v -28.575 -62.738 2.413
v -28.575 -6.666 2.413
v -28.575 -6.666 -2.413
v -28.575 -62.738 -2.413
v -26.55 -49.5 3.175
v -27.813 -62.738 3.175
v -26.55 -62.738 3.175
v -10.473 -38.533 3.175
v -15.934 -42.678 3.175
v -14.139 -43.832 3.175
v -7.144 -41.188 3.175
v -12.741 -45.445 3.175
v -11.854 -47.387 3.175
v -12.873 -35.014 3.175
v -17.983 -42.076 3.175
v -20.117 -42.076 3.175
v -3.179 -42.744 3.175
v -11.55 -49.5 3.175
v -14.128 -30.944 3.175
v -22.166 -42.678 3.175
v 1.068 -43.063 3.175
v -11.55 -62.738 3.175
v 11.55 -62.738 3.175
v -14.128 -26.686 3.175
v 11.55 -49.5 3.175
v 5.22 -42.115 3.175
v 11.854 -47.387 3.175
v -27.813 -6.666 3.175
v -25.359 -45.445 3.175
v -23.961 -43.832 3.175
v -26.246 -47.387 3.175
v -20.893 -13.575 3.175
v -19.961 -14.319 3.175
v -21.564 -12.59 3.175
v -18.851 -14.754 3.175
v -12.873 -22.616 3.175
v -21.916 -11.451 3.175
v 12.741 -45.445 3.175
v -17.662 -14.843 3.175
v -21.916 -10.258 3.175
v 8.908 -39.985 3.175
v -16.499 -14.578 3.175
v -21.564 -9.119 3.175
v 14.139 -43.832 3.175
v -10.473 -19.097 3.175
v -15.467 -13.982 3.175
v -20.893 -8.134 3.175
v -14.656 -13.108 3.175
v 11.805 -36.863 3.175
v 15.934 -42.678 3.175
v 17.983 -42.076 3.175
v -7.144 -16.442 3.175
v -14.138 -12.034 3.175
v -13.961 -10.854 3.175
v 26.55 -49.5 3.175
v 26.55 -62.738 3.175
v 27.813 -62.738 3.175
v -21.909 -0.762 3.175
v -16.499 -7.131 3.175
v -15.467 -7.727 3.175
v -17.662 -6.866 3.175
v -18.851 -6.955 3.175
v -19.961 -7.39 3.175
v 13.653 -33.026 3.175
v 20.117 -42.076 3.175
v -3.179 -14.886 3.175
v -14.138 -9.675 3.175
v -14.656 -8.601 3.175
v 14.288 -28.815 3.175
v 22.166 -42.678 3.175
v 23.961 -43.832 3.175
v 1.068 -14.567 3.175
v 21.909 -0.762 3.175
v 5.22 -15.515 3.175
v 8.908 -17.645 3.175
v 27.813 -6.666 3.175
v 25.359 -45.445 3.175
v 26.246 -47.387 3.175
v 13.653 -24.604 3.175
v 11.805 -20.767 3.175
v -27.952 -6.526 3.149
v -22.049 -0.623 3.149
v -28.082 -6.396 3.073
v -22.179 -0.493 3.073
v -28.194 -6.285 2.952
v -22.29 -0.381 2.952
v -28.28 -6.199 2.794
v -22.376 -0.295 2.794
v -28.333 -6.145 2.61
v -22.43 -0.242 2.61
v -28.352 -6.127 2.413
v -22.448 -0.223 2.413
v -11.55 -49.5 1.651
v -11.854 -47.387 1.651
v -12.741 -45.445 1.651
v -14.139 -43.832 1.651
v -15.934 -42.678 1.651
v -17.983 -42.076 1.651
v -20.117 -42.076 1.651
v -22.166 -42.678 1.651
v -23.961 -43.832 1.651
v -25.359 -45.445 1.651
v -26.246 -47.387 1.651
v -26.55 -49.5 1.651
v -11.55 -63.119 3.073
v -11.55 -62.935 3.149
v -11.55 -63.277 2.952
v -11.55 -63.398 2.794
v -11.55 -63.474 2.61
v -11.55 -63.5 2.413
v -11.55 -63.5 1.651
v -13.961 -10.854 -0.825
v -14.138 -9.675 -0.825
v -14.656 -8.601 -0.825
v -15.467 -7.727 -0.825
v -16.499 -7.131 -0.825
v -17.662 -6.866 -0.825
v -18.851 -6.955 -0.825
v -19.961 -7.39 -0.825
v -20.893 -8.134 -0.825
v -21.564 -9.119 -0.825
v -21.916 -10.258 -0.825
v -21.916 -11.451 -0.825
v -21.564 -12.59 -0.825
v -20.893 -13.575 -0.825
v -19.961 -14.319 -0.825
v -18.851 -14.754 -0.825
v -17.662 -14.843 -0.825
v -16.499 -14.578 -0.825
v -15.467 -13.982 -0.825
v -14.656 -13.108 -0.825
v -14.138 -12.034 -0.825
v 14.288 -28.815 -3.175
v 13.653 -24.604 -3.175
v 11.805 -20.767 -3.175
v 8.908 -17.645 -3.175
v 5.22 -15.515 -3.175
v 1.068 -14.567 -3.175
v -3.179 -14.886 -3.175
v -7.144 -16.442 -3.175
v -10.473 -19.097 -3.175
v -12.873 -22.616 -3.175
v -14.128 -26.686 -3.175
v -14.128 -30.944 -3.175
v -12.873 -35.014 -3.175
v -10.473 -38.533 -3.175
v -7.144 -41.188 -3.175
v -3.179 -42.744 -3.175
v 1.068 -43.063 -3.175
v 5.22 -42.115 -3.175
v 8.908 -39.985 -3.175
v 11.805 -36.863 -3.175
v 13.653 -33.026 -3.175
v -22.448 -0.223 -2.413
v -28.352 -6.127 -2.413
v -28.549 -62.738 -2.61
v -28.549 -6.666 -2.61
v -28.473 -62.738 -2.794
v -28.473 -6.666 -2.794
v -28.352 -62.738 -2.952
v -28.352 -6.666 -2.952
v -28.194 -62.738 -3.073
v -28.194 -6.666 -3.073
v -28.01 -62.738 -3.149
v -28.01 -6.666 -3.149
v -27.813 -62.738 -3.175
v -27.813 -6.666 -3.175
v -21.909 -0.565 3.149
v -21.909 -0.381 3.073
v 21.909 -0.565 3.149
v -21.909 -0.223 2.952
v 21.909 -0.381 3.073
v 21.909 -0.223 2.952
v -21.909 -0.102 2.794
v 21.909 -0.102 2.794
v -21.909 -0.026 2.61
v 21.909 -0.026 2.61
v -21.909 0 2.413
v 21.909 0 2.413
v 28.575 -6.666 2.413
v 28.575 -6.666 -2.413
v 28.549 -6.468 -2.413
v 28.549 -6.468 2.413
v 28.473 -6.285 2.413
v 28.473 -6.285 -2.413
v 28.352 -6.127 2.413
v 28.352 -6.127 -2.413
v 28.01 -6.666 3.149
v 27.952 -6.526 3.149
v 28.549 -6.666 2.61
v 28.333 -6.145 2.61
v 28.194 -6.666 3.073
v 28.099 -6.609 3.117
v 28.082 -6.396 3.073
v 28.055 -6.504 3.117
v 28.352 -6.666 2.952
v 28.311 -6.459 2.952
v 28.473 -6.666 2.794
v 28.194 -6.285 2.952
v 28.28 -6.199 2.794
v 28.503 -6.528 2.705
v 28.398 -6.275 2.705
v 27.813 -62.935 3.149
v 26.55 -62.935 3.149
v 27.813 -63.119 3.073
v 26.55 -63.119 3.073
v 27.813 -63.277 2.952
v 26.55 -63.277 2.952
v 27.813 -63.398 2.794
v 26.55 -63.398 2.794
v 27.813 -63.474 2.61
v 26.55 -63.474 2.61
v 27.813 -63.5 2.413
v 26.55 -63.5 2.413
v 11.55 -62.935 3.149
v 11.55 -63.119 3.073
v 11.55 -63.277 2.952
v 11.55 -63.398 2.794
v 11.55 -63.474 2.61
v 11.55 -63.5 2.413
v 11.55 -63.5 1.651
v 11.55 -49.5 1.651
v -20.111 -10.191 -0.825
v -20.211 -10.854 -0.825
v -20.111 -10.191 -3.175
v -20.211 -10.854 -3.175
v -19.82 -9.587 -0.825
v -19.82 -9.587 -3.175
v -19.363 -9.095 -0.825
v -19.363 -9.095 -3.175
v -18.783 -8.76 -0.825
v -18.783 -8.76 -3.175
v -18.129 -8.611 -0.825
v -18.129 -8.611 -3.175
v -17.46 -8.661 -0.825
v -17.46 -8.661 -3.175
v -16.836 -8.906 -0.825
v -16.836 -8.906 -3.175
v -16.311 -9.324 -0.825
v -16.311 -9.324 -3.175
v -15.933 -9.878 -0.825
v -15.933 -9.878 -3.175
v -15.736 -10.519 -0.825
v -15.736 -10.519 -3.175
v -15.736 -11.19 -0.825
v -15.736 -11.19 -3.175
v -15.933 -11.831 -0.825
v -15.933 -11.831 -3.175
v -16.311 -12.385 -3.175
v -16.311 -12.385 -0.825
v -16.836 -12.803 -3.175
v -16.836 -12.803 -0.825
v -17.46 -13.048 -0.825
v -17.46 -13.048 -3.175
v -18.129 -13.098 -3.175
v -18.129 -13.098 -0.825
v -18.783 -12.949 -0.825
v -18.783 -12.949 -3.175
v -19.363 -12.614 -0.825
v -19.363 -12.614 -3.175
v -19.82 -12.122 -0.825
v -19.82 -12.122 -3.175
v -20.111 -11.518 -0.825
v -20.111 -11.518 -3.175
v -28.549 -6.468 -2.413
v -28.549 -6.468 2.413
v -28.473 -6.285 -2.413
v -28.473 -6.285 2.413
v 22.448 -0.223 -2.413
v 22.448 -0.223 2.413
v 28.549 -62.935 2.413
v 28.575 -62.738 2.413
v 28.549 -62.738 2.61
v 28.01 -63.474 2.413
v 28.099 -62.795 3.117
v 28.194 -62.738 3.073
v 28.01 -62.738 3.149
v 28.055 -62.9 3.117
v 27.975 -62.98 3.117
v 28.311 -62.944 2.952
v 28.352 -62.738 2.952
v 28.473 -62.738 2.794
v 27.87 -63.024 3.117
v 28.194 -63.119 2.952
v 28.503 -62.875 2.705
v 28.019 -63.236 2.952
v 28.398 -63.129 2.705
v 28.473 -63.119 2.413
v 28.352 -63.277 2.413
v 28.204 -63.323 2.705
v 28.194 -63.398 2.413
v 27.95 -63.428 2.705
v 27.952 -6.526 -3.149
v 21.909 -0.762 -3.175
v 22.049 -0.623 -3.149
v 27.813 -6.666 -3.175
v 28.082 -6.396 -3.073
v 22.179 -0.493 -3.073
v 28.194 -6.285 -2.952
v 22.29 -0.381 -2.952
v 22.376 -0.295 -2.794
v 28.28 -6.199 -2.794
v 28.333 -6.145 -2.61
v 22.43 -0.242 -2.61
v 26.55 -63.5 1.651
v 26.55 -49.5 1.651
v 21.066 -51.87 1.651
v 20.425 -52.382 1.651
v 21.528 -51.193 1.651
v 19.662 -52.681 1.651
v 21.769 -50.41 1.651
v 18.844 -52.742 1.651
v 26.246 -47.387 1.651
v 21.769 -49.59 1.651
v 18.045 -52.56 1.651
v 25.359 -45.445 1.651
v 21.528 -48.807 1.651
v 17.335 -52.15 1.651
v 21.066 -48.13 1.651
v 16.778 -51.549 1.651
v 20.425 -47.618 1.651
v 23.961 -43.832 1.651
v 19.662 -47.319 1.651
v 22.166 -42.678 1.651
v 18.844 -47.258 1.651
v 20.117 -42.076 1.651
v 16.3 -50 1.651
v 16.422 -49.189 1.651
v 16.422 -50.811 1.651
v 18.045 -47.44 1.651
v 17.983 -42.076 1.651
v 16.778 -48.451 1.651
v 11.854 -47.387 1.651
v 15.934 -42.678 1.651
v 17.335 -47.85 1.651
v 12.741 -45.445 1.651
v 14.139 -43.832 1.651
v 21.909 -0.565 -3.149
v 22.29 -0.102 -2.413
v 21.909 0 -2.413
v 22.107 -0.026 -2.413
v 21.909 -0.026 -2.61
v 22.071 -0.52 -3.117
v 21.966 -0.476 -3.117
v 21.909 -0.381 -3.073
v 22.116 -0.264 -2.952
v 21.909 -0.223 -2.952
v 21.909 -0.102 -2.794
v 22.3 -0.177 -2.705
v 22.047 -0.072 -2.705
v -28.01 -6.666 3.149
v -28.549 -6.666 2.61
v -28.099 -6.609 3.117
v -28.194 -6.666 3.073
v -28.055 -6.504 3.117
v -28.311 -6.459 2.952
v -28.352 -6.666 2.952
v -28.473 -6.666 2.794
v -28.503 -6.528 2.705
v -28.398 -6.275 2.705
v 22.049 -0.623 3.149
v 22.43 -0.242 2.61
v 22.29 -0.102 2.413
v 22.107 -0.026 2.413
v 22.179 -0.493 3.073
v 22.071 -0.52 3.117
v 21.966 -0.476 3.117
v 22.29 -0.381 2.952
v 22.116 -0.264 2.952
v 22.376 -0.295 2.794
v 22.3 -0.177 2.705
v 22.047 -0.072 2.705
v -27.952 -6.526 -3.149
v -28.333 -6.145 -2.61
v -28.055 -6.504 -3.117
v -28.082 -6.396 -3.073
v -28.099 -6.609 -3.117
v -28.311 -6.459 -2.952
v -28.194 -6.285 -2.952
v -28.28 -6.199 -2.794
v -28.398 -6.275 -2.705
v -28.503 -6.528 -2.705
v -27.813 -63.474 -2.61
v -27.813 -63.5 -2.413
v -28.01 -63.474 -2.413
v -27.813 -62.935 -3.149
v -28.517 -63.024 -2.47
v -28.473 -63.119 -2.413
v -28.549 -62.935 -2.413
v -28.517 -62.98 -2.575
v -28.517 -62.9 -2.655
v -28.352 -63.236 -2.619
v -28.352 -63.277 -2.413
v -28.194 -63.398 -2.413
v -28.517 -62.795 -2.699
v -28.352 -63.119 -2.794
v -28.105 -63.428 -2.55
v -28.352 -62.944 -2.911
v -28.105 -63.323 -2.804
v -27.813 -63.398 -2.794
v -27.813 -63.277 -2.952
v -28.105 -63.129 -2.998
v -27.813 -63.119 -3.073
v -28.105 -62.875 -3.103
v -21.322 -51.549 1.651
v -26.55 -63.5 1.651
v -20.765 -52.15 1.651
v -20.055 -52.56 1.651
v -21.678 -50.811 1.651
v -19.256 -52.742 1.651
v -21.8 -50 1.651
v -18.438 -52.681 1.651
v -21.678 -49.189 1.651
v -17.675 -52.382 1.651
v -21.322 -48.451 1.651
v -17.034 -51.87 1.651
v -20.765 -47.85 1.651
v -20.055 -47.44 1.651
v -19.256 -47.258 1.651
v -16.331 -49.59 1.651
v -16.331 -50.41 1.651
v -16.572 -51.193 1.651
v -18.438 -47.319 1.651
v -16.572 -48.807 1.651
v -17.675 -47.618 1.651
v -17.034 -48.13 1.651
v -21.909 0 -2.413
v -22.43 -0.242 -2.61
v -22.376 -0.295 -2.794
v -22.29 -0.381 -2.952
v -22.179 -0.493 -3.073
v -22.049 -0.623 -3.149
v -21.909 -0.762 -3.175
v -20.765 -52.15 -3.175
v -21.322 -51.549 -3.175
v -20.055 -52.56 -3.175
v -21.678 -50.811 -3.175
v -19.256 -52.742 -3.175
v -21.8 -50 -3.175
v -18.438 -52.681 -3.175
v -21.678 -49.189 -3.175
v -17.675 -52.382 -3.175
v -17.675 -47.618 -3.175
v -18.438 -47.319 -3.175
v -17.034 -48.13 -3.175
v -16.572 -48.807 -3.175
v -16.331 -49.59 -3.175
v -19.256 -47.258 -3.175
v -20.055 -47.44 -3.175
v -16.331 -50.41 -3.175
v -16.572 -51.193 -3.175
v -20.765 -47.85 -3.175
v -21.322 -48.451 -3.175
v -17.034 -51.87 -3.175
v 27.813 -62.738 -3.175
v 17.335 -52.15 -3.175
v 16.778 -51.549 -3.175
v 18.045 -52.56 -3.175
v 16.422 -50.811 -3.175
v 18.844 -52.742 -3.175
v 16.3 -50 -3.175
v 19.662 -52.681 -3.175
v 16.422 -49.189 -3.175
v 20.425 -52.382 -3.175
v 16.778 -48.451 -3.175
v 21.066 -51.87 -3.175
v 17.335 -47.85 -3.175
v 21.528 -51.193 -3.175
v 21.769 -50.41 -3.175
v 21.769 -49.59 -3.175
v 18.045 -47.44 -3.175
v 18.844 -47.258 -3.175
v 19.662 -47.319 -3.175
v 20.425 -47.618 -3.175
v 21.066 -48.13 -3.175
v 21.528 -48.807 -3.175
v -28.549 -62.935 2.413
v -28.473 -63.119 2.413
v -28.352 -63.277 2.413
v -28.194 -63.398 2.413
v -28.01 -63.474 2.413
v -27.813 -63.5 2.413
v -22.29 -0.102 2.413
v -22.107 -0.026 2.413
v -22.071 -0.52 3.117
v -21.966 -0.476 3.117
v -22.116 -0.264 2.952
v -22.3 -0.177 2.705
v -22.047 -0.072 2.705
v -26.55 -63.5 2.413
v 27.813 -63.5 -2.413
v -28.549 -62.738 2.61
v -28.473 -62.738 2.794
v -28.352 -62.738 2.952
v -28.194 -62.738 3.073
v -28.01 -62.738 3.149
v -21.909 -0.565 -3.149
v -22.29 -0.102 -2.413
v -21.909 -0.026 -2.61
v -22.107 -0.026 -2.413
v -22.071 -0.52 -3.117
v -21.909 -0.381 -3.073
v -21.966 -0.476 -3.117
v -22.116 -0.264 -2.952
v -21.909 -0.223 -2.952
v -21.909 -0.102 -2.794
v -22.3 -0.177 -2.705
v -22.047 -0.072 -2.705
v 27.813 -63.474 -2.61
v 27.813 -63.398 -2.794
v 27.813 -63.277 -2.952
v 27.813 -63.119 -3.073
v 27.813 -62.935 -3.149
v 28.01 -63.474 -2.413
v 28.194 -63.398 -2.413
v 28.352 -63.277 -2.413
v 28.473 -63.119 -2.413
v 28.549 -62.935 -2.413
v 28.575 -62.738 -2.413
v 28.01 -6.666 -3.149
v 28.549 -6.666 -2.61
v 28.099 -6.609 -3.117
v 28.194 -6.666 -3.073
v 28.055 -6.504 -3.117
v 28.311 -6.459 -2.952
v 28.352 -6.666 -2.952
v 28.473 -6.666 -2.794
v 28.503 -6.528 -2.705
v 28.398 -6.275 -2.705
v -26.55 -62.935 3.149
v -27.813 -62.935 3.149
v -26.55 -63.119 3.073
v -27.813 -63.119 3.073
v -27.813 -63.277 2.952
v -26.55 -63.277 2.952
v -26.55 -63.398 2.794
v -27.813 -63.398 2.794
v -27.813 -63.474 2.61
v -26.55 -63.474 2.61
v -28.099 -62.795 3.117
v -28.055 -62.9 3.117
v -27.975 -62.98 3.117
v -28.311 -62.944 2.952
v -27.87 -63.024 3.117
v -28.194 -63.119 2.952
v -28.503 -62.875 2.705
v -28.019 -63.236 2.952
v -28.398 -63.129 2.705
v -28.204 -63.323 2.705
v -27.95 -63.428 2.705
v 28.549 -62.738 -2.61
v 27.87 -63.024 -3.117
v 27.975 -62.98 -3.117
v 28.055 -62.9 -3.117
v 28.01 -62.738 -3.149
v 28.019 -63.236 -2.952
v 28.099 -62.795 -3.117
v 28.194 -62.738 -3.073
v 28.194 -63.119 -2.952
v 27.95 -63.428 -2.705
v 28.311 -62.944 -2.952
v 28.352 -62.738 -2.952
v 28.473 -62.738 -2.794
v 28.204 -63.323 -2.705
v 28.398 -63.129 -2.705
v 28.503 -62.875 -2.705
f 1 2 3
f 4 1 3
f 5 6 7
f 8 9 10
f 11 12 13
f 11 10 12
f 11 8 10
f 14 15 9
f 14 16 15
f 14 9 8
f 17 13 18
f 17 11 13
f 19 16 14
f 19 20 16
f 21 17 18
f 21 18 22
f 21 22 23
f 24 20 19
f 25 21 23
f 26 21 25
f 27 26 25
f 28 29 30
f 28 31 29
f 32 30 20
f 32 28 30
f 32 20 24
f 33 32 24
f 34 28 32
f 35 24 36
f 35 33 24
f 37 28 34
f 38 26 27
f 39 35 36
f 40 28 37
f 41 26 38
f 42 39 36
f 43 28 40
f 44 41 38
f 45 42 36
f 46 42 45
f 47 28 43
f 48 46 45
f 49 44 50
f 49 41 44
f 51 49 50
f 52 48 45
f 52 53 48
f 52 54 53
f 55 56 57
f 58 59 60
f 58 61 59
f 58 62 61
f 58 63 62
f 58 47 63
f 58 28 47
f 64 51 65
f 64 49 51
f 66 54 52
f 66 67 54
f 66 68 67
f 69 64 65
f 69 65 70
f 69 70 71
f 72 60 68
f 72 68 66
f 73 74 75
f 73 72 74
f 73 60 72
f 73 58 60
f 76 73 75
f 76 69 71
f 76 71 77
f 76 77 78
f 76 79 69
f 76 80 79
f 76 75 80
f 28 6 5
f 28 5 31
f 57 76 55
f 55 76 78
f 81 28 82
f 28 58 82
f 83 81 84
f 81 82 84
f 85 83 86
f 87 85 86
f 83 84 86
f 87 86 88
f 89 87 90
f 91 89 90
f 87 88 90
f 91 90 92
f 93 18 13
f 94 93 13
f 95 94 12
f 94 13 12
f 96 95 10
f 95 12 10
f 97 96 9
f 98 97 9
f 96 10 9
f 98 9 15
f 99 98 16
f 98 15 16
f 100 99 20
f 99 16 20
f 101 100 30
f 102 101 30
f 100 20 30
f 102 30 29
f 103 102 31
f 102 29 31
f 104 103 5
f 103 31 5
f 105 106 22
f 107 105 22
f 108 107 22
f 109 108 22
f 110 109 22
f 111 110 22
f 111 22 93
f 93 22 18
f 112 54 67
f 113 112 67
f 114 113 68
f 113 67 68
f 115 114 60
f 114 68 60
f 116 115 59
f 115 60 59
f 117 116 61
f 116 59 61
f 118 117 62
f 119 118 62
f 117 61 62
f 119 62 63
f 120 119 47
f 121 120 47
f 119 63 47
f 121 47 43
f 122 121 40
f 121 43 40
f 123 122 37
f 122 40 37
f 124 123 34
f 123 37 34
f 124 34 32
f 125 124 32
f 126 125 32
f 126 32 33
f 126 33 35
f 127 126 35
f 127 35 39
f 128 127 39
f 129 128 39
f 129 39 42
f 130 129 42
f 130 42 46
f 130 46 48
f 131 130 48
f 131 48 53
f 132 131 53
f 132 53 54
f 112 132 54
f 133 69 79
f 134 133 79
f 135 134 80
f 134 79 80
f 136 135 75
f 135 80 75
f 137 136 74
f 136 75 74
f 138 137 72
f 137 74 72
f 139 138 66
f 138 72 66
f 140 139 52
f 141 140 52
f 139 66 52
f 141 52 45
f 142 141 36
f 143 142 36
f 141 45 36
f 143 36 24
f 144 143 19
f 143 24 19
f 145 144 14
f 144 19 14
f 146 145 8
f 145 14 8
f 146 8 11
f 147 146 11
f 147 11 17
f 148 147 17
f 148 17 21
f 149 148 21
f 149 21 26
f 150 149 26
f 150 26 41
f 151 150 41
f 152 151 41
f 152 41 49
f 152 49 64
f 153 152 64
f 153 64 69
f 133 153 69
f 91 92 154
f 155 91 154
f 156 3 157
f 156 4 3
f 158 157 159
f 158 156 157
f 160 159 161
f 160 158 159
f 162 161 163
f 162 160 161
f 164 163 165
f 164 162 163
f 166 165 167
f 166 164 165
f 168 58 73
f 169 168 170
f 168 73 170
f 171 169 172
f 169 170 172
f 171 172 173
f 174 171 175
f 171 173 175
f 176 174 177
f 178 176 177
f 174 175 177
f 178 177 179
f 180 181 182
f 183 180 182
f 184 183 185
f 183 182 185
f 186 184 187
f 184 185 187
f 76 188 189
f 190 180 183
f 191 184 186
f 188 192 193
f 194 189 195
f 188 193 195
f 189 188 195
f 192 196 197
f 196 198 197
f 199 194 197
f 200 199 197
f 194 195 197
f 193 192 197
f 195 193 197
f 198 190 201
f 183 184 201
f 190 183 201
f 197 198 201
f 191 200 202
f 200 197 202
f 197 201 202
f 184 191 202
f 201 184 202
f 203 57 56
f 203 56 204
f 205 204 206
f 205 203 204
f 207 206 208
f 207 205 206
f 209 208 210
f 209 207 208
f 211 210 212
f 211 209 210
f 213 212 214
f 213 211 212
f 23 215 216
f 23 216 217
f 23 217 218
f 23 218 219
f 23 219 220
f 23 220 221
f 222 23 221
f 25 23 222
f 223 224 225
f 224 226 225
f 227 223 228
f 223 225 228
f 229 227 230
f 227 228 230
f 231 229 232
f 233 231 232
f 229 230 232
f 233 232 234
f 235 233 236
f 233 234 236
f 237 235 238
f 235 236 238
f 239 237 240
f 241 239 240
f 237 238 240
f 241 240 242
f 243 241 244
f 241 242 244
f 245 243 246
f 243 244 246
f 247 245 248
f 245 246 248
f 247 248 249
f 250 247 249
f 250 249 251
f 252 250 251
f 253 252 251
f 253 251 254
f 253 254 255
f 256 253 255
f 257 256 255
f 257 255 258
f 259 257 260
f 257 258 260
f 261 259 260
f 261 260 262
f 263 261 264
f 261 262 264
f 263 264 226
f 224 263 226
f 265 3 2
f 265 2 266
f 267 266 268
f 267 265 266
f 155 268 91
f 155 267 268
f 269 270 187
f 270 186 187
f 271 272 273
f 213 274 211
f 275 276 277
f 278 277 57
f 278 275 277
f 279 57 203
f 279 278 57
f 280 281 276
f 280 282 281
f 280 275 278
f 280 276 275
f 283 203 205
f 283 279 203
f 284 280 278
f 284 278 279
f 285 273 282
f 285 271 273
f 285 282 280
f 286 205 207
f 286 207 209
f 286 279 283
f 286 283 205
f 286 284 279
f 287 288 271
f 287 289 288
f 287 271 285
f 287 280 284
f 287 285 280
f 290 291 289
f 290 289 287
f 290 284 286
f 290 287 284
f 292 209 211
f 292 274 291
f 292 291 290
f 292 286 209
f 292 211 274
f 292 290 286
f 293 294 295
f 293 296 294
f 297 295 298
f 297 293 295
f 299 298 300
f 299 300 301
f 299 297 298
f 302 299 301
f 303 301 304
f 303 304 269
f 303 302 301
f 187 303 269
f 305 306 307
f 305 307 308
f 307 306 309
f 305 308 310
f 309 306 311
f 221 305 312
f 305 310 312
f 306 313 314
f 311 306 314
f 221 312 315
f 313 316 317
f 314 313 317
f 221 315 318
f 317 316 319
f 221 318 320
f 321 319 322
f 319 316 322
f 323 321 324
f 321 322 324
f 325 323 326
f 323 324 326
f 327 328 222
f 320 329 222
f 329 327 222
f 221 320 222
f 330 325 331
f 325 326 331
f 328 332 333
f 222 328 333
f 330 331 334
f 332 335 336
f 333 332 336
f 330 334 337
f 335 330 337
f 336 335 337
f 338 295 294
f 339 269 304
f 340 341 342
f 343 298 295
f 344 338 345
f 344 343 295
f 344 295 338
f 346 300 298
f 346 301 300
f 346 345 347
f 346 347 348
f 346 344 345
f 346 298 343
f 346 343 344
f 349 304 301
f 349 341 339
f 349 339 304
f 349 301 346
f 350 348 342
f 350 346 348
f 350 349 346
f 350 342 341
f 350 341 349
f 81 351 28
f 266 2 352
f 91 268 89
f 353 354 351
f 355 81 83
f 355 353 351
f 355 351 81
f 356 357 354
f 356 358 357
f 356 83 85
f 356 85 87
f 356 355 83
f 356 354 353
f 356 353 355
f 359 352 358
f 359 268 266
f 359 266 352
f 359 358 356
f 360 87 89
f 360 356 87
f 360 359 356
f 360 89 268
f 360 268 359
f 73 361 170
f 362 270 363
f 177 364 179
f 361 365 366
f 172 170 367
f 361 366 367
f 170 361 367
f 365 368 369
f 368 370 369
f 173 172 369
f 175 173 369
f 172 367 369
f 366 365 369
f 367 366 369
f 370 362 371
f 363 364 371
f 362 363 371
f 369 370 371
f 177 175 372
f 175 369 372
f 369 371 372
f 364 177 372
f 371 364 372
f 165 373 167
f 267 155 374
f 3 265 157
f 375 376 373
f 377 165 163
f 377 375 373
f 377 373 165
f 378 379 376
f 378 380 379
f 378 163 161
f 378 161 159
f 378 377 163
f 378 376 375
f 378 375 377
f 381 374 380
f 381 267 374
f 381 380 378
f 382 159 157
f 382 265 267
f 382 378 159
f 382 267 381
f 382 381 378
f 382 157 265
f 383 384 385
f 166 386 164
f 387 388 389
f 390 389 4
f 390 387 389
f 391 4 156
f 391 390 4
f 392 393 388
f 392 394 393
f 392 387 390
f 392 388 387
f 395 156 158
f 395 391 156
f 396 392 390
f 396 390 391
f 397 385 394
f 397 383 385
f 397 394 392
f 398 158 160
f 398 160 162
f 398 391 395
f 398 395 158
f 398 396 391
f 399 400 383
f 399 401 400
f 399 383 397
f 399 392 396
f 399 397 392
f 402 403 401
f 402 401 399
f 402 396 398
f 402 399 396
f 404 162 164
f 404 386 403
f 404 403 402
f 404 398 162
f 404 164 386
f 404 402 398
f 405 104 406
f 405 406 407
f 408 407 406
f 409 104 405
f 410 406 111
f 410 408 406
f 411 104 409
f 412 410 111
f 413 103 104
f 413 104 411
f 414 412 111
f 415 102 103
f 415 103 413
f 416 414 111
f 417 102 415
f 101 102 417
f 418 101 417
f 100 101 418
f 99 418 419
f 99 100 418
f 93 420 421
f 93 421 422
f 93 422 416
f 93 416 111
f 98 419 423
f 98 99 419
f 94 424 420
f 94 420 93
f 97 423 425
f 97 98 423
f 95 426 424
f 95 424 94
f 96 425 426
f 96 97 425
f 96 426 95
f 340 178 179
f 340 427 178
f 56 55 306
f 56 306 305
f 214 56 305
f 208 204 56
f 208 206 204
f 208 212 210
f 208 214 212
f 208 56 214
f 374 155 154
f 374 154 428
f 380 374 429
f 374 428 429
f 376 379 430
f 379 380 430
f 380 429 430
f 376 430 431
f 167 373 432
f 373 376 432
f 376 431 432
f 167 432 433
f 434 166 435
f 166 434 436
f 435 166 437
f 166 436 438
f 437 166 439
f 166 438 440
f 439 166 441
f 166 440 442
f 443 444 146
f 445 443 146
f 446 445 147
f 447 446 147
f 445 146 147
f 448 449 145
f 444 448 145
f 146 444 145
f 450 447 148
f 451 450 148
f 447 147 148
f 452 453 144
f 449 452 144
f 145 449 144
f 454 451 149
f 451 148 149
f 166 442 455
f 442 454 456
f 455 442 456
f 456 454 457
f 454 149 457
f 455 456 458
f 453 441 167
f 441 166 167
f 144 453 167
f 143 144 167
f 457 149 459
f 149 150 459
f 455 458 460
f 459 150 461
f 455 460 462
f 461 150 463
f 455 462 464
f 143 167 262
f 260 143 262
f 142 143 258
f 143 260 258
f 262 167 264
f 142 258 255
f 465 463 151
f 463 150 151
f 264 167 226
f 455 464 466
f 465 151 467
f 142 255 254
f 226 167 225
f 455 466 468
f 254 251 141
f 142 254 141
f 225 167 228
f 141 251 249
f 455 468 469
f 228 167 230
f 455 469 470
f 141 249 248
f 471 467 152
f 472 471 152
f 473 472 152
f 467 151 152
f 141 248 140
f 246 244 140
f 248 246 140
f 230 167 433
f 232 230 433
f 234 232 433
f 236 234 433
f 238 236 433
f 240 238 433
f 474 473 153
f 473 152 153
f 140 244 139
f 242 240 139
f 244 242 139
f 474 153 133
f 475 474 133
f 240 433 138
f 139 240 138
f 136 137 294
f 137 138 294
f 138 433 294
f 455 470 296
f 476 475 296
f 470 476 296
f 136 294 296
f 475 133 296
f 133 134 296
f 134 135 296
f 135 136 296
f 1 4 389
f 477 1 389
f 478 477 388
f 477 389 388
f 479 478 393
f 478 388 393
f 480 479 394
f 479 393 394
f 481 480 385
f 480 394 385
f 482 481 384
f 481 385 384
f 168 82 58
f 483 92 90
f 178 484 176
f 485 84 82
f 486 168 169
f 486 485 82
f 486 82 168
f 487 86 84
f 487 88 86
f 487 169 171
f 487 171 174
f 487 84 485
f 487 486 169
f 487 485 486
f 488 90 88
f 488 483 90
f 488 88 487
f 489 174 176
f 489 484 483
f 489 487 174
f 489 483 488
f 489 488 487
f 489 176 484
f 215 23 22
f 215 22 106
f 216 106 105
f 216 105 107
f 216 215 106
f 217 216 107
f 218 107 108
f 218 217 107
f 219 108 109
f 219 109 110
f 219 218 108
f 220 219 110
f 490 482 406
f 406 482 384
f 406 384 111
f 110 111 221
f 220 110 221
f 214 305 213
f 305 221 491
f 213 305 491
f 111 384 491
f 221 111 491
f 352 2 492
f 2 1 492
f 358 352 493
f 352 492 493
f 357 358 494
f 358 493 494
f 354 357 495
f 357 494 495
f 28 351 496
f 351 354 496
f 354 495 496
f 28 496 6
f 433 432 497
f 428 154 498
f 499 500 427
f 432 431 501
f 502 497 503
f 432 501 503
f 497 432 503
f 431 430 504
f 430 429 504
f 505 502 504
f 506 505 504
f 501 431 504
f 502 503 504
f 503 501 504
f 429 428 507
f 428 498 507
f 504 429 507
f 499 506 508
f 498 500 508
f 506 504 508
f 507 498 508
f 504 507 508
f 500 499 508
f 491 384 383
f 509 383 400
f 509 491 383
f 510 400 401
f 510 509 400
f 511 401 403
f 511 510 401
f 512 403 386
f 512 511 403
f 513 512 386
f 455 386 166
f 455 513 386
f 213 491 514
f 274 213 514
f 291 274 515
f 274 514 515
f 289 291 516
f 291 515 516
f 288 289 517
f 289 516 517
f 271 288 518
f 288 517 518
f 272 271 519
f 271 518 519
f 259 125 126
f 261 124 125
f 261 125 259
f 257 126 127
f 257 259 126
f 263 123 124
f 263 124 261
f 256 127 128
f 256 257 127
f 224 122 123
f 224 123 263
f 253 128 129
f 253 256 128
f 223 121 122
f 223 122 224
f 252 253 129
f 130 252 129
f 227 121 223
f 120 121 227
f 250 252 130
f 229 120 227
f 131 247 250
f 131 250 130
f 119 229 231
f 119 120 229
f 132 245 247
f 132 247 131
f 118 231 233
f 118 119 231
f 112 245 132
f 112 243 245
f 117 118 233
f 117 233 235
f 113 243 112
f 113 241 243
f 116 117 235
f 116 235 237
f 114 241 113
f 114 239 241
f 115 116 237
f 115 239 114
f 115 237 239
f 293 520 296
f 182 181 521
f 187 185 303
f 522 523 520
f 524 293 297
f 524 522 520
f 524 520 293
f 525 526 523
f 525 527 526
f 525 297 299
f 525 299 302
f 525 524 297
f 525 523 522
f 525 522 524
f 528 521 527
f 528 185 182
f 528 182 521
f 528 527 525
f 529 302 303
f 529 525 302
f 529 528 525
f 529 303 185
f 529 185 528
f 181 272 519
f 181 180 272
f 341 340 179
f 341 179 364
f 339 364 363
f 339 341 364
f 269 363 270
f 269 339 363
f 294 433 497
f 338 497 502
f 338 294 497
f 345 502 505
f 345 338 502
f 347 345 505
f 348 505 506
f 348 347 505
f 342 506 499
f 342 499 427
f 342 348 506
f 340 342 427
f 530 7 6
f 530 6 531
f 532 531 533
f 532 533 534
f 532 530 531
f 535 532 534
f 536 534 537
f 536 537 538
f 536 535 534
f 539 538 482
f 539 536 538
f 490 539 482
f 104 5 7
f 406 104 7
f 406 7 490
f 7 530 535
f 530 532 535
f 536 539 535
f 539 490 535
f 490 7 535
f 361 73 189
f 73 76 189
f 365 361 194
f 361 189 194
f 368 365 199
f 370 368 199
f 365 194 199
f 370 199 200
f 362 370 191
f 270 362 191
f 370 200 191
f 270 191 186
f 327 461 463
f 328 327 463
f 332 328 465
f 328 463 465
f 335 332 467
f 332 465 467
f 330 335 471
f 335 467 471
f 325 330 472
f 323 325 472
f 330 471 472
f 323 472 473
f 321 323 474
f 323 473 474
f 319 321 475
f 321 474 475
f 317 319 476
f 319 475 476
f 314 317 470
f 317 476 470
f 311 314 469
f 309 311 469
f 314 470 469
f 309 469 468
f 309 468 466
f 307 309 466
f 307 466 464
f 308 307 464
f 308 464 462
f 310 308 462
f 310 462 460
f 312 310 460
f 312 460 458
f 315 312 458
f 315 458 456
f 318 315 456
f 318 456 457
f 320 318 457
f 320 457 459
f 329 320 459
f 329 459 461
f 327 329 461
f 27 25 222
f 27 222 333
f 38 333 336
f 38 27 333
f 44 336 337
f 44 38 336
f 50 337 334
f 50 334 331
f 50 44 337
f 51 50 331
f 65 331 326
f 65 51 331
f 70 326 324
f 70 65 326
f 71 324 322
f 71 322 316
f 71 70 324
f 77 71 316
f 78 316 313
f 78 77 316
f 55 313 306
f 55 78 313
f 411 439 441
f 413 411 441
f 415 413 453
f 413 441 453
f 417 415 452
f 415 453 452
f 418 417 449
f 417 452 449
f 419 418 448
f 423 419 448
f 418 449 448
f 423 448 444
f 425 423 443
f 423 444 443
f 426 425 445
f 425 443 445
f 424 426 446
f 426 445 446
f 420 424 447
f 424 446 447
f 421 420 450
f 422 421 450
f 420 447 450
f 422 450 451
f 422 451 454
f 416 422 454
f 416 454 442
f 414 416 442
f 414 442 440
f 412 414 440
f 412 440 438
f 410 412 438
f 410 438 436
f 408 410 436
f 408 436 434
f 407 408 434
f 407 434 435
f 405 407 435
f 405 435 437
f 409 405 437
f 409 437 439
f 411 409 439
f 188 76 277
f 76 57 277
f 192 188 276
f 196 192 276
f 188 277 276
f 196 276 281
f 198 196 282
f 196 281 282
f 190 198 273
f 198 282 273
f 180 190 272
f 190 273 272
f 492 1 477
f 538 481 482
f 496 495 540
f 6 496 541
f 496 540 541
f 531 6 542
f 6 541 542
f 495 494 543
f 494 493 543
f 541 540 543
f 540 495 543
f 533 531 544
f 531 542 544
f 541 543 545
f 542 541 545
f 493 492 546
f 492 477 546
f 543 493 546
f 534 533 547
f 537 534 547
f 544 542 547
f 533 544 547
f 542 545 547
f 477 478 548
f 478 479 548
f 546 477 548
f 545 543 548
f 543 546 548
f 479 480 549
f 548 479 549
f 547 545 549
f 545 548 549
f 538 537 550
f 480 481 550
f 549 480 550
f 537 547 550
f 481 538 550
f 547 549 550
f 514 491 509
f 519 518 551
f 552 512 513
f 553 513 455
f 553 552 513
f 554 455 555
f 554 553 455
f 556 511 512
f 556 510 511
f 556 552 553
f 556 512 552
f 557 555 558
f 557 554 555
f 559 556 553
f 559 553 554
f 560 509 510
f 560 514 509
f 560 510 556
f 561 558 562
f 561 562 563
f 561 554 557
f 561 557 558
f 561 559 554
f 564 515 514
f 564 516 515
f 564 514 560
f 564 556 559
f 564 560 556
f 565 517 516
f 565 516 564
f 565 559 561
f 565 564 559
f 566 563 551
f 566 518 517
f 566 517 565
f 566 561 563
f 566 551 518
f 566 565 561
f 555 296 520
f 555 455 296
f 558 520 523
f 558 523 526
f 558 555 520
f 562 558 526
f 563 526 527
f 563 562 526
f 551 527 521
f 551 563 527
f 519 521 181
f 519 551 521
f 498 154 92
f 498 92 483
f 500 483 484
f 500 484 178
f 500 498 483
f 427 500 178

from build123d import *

# Parameters (mm, degrees)
SKETCH2_W                      = 57.15
SKETCH2_H                      = 6.35
BOSS_EXTRUDE1_DEPTH            = 63.5
SKETCH3_R                      = 14.2875
CUT_EXTRUDE1_DEPTH             = 70.922121857
CHAMFER1_SIZE                  = 6.35
M5_CLEARANCE_HOLE1_D           = 5.5
FILLET1_R                      = 0.762
CUT_EXTRUDE4_DEPTH             = 1.524
CBORE_FOR_M4_SHCS2_D           = 4.5
CBORE_FOR_M4_SHCS2_CBORE_D     = 8
CBORE_FOR_M4_SHCS2_CBORE_DEPTH = 4


with BuildPart() as part:
    # Sketch2 → Boss-Extrude1 (new body)
    with BuildSketch(Plane(origin=(0, 0, 0), x_dir=(1, 0, 0), z_dir=(0, 1, 0))):
        Rectangle(SKETCH2_W, SKETCH2_H)
    extrude(amount=-BOSS_EXTRUDE1_DEPTH)

    # Sketch3 → Cut-Extrude1 (cut, through all)
    with BuildSketch(Plane.XY.offset(3.175)):
        with Locations((0, -28.8150046)):
            Circle(SKETCH3_R)
    extrude(amount=-CUT_EXTRUDE1_DEPTH, mode=Mode.SUBTRACT)

    # Chamfer1
    chamfer1_edges = [part.edges().sort_by_distance(p)[0] for p in [
        (28.575, 0, 0),
        (-28.575, 0, 0),
    ]]
    chamfer(chamfer1_edges, length=CHAMFER1_SIZE)

    # M5 Clearance Hole1 (through all)
    with Locations(Plane.XY.offset(3.175)):
        with Locations((-19.05, -50.000003124), (19.05, -50.000003124)):
            Hole(M5_CLEARANCE_HOLE1_D / 2)

    # Fillet1
    fillet1_edges = [part.edges().sort_by_distance(p)[0] for p in [
        (28.575, -63.5, 0),
        (0, -63.5, -3.175),
        (0, 0, 3.175),
        (0, 0, -3.175),
        (22.225, 0, 0),
        (-22.225, 0, 0),
        (25.4, -3.175, 3.175),
        (-25.4, -3.175, 3.175),
        (-28.575, -6.35, 0),
        (25.4, -3.175, -3.175),
        (-25.4, -3.175, -3.175),
        (28.575, -6.35, 0),
        (-28.575, -63.5, 0),
        (-28.575, -34.925, -3.175),
        (28.575, -34.925, -3.175),
        (28.575, -34.925, 3.175),
        (-28.575, -34.925, 3.175),
        (0, -63.5, 3.175),
    ]]
    fillet(fillet1_edges, radius=FILLET1_R)

    # Sketch8 → Cut-Extrude4 (cut)
    with BuildSketch(Plane.XY.offset(3.175)):
        with BuildLine():
            Line((11.55, -63.5), (11.55, -49.5))
            ThreePointArc((11.55, -49.5), (19.05, -42), (26.55, -49.5))
            Line((26.55, -49.5), (26.55, -63.5))
            Line((26.55, -63.5), (11.55, -63.5))
        make_face()
    cut_extrude4 = extrude(amount=-CUT_EXTRUDE4_DEPTH, mode=Mode.SUBTRACT)

    # Mirror1: Cut-Extrude4 across plane
    add(cut_extrude4.mirror(Plane(origin=(0, 0, 0), x_dir=(0, 0, 1), z_dir=(1, 0, 0))), mode=Mode.SUBTRACT)

    # CBORE for M4 SHCS2 (through all)
    with Locations(Plane.XY.offset(3.175)):
        with Locations((-17.9605178, -10.8544868)):
            CounterBoreHole(CBORE_FOR_M4_SHCS2_D / 2, CBORE_FOR_M4_SHCS2_CBORE_D / 2, CBORE_FOR_M4_SHCS2_CBORE_DEPTH)


solid = part.part
